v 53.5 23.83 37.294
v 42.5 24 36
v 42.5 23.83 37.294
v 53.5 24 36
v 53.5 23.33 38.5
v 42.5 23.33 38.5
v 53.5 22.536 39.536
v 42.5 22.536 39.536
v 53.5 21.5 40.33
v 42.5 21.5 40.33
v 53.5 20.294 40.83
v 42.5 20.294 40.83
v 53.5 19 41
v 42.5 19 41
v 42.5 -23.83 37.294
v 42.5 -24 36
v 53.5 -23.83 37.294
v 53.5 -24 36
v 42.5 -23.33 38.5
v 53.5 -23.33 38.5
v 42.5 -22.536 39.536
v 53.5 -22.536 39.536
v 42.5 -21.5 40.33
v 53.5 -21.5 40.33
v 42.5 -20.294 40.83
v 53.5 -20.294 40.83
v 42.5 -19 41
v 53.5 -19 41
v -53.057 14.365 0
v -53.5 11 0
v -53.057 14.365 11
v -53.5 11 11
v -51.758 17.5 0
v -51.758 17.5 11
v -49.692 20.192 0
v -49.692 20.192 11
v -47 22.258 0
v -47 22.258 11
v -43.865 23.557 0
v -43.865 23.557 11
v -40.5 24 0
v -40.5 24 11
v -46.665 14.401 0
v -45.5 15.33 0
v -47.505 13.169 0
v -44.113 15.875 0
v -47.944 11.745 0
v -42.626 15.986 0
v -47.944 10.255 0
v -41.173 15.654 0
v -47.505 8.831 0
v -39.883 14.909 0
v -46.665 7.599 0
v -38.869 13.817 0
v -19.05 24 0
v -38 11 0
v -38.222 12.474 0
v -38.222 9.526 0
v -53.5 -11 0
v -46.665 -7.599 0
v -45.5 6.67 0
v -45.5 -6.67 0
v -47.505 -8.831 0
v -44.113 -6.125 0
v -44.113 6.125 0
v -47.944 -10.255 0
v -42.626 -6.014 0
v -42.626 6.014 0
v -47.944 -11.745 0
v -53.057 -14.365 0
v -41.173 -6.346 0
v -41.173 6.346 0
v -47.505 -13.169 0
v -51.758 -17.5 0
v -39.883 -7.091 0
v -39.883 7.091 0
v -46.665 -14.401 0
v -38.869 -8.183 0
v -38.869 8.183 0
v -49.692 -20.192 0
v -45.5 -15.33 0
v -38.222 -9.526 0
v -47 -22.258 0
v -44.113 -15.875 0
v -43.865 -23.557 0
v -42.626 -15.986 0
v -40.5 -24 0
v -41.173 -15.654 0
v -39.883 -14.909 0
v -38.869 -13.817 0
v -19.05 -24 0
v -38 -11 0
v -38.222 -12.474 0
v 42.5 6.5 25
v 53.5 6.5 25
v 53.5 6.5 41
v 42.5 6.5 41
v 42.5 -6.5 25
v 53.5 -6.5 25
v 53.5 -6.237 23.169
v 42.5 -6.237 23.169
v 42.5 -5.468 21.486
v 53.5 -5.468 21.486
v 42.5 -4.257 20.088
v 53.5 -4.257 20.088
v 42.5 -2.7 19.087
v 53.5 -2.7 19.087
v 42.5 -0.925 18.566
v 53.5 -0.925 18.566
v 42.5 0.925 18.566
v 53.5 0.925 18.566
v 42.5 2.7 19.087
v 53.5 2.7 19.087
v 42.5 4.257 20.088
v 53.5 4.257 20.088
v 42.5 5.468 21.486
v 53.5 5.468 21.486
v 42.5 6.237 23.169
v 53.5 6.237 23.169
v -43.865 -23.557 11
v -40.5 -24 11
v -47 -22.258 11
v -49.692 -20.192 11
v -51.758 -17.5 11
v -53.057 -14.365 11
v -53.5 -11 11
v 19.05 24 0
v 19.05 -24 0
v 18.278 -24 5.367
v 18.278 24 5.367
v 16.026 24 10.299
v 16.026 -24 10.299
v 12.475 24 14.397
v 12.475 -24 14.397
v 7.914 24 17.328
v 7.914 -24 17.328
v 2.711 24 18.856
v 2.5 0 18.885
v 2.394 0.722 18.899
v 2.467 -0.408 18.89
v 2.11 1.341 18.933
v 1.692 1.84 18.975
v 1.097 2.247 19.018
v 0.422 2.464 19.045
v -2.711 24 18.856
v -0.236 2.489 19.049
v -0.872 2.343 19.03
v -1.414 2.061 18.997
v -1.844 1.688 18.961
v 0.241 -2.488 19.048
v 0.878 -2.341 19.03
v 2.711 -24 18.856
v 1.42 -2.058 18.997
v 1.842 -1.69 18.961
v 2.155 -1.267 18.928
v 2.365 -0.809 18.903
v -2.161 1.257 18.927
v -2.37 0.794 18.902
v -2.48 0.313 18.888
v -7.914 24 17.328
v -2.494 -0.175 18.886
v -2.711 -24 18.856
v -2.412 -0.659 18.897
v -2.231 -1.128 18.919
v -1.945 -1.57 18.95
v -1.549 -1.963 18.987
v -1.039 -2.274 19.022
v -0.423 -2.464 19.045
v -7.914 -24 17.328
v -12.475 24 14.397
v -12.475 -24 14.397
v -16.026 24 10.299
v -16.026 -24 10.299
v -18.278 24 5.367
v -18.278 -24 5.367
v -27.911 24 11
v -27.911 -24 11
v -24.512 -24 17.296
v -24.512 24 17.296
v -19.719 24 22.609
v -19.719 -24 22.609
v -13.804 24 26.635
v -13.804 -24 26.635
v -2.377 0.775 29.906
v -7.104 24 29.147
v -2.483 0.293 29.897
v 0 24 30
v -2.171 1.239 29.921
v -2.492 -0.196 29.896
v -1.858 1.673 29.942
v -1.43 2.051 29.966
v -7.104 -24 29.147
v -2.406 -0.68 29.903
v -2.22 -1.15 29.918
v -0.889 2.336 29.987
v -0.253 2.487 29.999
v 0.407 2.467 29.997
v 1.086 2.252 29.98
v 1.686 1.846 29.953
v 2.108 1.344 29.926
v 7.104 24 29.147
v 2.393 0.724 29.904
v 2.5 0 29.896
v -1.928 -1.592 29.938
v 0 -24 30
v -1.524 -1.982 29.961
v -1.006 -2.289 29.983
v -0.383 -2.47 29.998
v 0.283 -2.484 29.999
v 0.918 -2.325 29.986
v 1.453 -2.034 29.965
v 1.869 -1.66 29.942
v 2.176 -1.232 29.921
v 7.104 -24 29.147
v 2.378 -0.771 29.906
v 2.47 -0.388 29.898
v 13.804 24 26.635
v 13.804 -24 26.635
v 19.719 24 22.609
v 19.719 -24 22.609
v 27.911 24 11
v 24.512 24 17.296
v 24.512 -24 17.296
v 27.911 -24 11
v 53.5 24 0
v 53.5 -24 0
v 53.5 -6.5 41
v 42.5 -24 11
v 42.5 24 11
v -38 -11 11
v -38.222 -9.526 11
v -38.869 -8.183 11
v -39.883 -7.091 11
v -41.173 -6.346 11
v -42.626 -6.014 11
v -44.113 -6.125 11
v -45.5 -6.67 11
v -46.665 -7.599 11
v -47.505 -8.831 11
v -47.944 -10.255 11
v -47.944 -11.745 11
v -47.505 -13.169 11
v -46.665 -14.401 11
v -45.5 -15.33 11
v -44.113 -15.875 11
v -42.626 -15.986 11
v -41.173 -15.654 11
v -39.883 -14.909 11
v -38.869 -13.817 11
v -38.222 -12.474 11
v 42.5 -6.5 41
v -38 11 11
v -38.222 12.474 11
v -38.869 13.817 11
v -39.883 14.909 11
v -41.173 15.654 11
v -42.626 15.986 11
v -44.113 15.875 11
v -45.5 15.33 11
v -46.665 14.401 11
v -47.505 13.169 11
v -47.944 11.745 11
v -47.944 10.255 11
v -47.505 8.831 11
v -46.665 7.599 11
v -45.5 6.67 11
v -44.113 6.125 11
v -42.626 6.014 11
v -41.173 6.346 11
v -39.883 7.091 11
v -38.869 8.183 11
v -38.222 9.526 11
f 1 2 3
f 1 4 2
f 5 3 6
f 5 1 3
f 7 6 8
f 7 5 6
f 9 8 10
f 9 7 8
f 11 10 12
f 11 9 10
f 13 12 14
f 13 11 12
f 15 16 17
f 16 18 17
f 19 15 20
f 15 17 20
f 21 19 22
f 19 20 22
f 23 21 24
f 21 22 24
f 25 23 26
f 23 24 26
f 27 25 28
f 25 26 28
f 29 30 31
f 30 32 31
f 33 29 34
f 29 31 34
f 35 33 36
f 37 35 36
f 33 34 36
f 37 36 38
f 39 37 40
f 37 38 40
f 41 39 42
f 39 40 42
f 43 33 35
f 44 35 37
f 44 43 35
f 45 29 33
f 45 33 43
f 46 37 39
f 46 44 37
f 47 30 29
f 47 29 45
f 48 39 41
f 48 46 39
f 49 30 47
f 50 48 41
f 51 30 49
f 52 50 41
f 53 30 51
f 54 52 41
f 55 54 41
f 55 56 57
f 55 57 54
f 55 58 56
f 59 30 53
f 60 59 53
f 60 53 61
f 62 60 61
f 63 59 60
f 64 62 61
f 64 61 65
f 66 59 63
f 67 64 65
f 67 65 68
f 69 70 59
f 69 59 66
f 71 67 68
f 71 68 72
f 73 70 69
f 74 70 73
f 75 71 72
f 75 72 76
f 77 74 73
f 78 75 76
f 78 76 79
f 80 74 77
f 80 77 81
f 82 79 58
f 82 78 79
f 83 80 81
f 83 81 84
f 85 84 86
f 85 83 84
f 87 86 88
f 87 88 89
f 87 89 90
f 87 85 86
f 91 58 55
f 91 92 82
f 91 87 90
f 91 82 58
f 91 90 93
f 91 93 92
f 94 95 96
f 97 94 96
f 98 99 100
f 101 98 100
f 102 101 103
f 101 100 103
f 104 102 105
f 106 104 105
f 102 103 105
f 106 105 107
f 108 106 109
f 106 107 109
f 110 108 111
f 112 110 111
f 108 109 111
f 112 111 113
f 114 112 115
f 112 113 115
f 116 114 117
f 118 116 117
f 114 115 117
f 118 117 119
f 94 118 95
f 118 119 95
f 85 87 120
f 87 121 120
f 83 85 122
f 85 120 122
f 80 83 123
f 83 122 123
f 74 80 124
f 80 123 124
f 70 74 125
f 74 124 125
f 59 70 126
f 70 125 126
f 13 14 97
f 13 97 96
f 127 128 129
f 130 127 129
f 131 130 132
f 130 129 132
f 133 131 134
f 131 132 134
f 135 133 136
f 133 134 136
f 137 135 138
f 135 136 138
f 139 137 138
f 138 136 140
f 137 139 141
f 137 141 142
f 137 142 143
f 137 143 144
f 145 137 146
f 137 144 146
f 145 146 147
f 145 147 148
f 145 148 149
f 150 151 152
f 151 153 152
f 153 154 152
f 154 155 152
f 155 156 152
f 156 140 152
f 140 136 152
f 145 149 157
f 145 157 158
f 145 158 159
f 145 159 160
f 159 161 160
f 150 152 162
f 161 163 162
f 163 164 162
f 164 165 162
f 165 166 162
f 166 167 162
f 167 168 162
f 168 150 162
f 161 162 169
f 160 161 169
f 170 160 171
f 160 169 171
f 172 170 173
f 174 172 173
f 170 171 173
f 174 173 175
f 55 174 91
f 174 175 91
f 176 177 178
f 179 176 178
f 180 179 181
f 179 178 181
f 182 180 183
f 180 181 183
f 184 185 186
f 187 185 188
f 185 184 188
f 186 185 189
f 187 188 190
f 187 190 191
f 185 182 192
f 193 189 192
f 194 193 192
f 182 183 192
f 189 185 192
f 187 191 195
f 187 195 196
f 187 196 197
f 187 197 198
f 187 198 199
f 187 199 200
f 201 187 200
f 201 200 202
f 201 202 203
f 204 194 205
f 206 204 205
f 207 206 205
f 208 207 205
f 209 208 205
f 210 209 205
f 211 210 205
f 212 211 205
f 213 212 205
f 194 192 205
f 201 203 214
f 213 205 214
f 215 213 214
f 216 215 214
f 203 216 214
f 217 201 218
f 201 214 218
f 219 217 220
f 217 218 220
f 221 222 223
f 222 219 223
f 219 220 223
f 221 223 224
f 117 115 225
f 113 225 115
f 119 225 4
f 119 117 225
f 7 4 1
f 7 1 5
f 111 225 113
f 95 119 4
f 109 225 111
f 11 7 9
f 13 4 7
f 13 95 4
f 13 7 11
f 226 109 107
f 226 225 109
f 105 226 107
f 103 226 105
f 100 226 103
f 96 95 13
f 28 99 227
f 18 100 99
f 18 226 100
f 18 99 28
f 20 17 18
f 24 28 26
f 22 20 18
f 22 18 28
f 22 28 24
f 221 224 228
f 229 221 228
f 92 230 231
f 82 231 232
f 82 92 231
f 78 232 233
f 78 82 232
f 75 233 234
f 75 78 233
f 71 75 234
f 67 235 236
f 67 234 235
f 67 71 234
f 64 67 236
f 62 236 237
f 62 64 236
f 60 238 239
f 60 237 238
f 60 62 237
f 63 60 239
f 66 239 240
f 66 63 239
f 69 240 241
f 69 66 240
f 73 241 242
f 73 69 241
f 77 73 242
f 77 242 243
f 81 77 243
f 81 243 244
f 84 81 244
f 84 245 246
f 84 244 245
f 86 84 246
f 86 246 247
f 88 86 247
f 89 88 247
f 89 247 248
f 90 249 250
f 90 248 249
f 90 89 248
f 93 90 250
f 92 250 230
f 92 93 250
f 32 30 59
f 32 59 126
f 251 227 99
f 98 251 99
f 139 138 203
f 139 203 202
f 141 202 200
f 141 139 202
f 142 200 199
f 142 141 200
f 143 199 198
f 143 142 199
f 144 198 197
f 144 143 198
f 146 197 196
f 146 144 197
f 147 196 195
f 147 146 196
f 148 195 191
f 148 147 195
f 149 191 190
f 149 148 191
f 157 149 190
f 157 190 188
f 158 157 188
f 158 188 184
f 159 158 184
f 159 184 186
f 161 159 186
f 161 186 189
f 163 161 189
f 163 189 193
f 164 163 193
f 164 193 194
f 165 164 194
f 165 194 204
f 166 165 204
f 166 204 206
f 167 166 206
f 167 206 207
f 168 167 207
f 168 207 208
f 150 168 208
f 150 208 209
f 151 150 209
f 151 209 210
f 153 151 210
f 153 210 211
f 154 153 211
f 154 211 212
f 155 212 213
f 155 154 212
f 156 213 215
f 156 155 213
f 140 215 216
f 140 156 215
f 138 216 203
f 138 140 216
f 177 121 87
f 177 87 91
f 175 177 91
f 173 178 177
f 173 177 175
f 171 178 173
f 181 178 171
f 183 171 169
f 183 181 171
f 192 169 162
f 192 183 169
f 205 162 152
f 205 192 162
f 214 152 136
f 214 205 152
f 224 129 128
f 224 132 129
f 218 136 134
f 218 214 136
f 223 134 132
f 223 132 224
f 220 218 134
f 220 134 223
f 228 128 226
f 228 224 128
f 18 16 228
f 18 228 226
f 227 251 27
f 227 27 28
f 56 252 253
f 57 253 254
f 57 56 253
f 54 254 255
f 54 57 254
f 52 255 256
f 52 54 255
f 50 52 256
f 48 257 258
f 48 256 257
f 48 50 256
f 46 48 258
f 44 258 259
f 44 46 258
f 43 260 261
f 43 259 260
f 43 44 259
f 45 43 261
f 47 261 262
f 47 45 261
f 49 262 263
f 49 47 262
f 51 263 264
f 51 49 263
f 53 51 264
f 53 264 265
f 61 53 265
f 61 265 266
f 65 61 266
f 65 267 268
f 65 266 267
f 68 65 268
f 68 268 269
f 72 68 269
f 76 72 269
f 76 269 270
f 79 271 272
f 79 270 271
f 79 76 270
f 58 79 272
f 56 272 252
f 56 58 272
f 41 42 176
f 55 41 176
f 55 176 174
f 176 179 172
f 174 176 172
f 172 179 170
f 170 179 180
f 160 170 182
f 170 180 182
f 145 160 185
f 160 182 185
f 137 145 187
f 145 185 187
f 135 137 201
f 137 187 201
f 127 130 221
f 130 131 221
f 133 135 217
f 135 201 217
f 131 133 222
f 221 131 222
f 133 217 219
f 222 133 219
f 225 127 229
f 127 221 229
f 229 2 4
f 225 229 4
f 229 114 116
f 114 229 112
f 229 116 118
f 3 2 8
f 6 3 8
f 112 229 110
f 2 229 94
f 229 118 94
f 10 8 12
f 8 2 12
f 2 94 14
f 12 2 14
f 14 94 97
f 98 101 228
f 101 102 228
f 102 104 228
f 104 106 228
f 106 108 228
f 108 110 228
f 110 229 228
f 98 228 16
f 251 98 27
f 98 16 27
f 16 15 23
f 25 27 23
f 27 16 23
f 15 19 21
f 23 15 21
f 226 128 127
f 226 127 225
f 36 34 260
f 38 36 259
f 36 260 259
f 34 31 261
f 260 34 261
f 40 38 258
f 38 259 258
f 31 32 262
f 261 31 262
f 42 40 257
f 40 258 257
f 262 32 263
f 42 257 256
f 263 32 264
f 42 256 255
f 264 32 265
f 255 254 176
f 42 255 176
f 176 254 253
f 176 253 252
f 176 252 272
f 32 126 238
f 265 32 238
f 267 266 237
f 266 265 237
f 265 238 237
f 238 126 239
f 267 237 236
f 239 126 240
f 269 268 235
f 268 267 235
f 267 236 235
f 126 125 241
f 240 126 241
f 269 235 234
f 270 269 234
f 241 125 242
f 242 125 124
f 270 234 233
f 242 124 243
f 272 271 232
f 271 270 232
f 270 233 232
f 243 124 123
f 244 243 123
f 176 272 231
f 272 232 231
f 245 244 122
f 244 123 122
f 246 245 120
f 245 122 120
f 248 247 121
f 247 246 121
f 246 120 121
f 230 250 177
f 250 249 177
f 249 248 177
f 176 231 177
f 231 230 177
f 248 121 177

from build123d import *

# Parameters (mm, degrees)
F0_W     = 107
F0_H     = 41
F1_DEPTH = 24
F3_DEPTH = 48.001
F4_R     = 5
F5_R     = 13
F6_R     = 2.5
F6_R_2   = 5
F7_DEPTH = 41.001
F9_DEPTH = 11


with BuildPart() as f1:
    # F0 (on Front) → F1 (new body, symmetric)
    with BuildSketch(Plane.XZ):
        with Locations((0, 20.5)):
            Rectangle(F0_W, F0_H)
    extrude(amount=F1_DEPTH, both=True)

    # F2 (on face) → F3 (cut, through all)
    with BuildSketch(Plane.XZ.offset(24)):
        with BuildLine():
            ThreePointArc((-27.910571, 11), (0, 30), (27.910571, 11))
            Line((27.910571, 11), (42.5, 11))
            Line((42.5, 11), (42.5, 41))
            Line((42.5, 41), (-53.5, 41))
            Line((-53.5, 41), (-53.5, 11))
            Line((-53.5, 11), (-27.910571, 11))
        make_face()
        with BuildLine():
            Line((-19.05, 0), (19.05, 0))
            ThreePointArc((19.05, 0), (0, 19.05), (-19.05, 0))
        make_face()
    extrude(amount=-F3_DEPTH, mode=Mode.SUBTRACT)

    # F4
    f4_edges = [f1.edges().sort_by_distance(p)[0] for p in [
        (48, -24, 41),
        (48, 24, 41),
    ]]
    fillet(f4_edges, radius=F4_R)

    # F5
    f5_edges = [f1.edges().sort_by_distance(p)[0] for p in [
        (-53.5, -24, 5.5),
        (-53.5, 24, 5.5),
    ]]
    fillet(f5_edges, radius=F5_R)

    # F6 (on Top) → F7 (cut, through all)
    with BuildSketch(Plane.XY):
        Circle(F6_R)
        with Locations((-43, -11)):
            Circle(F6_R_2)
        with Locations((-43, 11)):
            Circle(F6_R_2)
    extrude(amount=F7_DEPTH, mode=Mode.SUBTRACT)

    # F8 (on face) → F9 (cut, through all)
    with BuildSketch(Plane.YZ.offset(53.5)):
        with BuildLine():
            Line((6.5, 41), (-6.5, 41))
            Line((-6.5, 41), (-6.5, 25))
            ThreePointArc((-6.5, 25), (0, 18.5), (6.5, 25))
            Line((6.5, 25), (6.5, 41))
        make_face()
    extrude(amount=-F9_DEPTH, mode=Mode.SUBTRACT)


solid = f1.part
